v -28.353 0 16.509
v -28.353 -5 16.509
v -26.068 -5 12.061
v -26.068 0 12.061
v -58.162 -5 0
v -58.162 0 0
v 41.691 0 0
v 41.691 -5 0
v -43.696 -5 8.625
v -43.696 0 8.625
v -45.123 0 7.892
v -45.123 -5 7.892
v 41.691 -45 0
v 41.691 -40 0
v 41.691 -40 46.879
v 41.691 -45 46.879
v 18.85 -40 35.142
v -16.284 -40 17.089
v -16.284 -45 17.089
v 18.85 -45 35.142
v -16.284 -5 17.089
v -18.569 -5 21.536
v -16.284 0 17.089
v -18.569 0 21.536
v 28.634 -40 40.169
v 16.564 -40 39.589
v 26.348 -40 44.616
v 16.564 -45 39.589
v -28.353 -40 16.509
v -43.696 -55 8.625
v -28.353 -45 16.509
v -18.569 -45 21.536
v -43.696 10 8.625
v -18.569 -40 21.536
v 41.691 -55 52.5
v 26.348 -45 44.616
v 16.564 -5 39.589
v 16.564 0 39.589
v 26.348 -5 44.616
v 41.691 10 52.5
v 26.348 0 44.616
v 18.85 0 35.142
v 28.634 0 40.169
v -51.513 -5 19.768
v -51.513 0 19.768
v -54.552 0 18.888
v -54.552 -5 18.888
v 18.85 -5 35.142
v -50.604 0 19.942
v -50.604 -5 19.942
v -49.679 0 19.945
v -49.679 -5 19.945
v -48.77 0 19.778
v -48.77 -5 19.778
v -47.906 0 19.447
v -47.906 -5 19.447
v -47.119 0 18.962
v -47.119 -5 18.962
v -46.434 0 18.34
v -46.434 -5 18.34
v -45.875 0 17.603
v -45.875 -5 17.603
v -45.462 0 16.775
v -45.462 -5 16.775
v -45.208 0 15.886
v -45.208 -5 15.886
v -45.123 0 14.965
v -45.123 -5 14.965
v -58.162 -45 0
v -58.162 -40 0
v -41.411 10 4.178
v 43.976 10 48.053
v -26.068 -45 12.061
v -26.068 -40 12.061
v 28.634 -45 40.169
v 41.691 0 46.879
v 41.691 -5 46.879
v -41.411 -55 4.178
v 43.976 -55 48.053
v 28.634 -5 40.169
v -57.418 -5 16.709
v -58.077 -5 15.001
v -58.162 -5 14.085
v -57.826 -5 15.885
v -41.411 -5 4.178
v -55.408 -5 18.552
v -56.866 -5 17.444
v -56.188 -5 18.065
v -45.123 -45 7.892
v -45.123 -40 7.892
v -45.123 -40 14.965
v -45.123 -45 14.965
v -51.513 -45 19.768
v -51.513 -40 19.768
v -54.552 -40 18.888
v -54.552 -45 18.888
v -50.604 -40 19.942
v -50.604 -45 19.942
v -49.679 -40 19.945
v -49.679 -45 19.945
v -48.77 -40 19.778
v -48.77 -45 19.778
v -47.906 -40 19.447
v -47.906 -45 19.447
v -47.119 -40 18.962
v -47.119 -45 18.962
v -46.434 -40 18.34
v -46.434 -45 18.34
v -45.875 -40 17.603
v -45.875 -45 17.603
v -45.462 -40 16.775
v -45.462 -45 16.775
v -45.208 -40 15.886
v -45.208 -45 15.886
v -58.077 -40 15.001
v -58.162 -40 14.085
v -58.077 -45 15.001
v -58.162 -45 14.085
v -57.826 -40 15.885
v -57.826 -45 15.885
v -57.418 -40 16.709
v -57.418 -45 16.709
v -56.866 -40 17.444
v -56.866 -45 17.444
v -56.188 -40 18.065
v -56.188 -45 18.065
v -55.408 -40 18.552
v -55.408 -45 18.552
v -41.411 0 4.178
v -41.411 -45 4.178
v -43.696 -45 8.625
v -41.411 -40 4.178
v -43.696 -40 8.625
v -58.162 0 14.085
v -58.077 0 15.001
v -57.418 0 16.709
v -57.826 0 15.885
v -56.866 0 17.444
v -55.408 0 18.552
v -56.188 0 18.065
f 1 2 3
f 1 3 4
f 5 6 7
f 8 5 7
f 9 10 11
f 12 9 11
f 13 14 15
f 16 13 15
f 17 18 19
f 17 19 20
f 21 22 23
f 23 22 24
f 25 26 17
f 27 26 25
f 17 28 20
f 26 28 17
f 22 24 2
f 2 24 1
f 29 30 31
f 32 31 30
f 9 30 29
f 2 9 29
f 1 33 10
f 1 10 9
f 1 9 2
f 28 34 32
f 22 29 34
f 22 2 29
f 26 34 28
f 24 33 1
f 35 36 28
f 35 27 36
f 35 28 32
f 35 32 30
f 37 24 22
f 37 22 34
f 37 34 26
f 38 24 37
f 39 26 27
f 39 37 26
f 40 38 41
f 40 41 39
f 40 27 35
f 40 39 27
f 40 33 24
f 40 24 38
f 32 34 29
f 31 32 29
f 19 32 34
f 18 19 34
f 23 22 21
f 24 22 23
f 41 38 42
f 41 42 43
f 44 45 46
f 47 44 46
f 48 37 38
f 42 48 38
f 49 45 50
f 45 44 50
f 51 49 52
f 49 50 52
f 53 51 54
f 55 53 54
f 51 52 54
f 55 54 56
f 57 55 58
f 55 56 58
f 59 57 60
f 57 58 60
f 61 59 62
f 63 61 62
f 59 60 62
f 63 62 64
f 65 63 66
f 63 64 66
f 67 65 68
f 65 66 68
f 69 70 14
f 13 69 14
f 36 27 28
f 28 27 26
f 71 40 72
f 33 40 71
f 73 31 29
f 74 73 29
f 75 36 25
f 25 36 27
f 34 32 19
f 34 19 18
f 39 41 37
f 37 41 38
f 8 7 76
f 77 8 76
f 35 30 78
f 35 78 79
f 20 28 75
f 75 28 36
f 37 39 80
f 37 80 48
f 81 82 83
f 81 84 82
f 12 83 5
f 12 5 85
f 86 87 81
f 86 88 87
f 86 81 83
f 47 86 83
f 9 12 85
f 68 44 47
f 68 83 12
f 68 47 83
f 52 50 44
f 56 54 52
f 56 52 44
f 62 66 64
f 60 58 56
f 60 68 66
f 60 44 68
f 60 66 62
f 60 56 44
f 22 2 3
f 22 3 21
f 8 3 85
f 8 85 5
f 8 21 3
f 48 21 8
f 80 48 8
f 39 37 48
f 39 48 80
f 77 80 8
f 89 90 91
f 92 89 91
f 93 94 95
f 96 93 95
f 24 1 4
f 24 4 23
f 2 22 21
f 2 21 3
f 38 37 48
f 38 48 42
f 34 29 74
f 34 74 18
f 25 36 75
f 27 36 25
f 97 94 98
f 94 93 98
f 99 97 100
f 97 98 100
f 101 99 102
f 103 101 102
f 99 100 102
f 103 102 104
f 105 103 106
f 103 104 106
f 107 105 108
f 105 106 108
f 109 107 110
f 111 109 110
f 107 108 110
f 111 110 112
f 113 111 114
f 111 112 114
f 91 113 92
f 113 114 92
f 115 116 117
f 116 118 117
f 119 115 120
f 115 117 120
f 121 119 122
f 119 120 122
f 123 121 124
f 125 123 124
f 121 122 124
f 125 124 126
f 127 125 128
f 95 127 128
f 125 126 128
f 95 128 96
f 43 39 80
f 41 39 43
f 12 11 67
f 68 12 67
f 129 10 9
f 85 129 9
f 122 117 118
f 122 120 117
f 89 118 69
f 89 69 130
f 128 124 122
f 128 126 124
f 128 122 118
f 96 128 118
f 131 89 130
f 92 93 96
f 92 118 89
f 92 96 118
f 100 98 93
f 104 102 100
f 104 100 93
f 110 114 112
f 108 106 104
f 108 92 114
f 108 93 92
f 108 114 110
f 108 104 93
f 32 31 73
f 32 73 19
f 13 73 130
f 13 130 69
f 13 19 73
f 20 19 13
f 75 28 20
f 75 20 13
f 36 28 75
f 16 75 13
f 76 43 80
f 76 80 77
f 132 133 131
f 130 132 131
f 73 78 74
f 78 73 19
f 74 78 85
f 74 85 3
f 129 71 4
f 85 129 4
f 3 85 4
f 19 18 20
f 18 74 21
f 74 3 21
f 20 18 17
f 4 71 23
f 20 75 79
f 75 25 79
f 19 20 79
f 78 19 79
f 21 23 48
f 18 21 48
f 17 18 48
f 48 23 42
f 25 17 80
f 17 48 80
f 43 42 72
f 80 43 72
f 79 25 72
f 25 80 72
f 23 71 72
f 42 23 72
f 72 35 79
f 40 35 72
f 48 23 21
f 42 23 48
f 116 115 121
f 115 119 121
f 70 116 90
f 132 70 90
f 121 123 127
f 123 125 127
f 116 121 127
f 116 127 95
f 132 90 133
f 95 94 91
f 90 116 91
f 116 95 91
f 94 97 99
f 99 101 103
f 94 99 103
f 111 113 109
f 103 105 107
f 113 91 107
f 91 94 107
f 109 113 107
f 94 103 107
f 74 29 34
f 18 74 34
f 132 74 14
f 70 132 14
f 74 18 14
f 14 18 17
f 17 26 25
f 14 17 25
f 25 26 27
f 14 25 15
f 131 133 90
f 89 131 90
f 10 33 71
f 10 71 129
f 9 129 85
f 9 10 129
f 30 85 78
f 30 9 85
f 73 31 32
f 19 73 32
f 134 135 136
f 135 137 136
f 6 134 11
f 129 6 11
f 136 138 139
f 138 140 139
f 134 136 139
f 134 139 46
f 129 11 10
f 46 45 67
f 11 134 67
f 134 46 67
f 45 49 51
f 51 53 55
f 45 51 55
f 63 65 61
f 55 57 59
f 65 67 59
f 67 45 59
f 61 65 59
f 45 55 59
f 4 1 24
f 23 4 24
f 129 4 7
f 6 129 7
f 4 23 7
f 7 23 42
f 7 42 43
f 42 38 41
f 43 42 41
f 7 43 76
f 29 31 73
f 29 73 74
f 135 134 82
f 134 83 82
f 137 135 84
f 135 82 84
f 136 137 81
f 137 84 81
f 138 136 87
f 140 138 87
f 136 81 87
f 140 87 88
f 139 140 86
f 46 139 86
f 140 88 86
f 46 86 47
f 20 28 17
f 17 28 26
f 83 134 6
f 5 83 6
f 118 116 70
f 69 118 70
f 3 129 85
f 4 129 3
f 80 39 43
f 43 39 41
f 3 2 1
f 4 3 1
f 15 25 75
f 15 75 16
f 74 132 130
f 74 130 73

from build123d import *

# Parameters (mm, degrees)
F2_DEPTH = 5
F4_W     = 39.5006872239
F4_H     = 5
F4_W_2   = 17.249656388
F4_W_3   = 11
F5_DEPTH = 5
F7_R     = 5
F7_2_R   = 5


with BuildPart() as f2:
    # F0 (on Front) → F2 (new body)
    with BuildSketch(Plane.XZ):
        Polygon((-58.161765337, 0), (41.6911840439, 0), (41.6911840439, 52.5000020862), (-45.1225526631, 7.8921569511), (-45.1225526631, 21.6176491231), (-58.161765337, 17.8431384265), align=None)
    extrude(amount=F2_DEPTH)


with BuildPart() as f3_1:
    # F3: copy of F2
    add(f2.part.moved(Location((0, -40, 0))))


with BuildPart() as f5:
    # F4 (on face) → F5 (new body)
    with BuildSketch(Plane(origin=(-12.6332554785, 0, 24.5862608145), x_dir=(0.8894511728, 0, 0.4570302083), z_dir=(-0.4570302083, 0, 0.8894511728))):
        with Locations((13.0763594298, -2.5)):
            Rectangle(F4_W, F4_H)
        with Locations((52.4515312358, -2.5)):
            Rectangle(F4_W_2, F4_H)
        Polygon((61.0763594298, 0), (61.0763594298, 10), (-34.9236405702, 10), (-34.9236405702, 0), (-17.6739841821, 0), (-6.6739841821, 0), (32.8267030418, 0), (43.8267030418, 0), align=None)
        Polygon((61.0763594298, -55), (61.0763594298, -5), (43.8267030418, -5), (32.8267030418, -5), (-6.6739841821, -5), (-17.6739841821, -5), (-34.9236405702, -5), (-34.9236405702, -55), align=None)
        with Locations((-12.1739841821, -42.5)):
            Rectangle(F4_W_3, F4_H, mode=Mode.SUBTRACT)
        with Locations((38.3267030418, -42.5)):
            Rectangle(F4_W_3, F4_H, mode=Mode.SUBTRACT)
        with Locations((-26.2988123761, -2.5)):
            Rectangle(F4_W_2, F4_H)
    extrude(amount=-F5_DEPTH)


with BuildPart() as f3_1_1:
    add(f3_1.part)

    # F6: cut F5
    add(f5.part, mode=Mode.SUBTRACT)

    # F7#2
    f7_2_edges = [f3_1_1.edges().sort_by_distance(p)[0] for p in [
        (-45.122553, -42.5, 21.617649),
        (-58.161765, -42.5, 17.843138),
    ]]
    fillet(f7_2_edges, radius=F7_2_R)


with BuildPart() as f2_1:
    add(f2.part)

    # F6: cut F5
    add(f5.part, mode=Mode.SUBTRACT)

    # F7
    f7_edges = [f2_1.edges().sort_by_distance(p)[0] for p in [
        (-45.122553, -2.5, 21.617649),
        (-58.161765, -2.5, 17.843138),
    ]]
    fillet(f7_edges, radius=F7_R)


solid = Compound([f5.part, f3_1_1.part, f2_1.part])
